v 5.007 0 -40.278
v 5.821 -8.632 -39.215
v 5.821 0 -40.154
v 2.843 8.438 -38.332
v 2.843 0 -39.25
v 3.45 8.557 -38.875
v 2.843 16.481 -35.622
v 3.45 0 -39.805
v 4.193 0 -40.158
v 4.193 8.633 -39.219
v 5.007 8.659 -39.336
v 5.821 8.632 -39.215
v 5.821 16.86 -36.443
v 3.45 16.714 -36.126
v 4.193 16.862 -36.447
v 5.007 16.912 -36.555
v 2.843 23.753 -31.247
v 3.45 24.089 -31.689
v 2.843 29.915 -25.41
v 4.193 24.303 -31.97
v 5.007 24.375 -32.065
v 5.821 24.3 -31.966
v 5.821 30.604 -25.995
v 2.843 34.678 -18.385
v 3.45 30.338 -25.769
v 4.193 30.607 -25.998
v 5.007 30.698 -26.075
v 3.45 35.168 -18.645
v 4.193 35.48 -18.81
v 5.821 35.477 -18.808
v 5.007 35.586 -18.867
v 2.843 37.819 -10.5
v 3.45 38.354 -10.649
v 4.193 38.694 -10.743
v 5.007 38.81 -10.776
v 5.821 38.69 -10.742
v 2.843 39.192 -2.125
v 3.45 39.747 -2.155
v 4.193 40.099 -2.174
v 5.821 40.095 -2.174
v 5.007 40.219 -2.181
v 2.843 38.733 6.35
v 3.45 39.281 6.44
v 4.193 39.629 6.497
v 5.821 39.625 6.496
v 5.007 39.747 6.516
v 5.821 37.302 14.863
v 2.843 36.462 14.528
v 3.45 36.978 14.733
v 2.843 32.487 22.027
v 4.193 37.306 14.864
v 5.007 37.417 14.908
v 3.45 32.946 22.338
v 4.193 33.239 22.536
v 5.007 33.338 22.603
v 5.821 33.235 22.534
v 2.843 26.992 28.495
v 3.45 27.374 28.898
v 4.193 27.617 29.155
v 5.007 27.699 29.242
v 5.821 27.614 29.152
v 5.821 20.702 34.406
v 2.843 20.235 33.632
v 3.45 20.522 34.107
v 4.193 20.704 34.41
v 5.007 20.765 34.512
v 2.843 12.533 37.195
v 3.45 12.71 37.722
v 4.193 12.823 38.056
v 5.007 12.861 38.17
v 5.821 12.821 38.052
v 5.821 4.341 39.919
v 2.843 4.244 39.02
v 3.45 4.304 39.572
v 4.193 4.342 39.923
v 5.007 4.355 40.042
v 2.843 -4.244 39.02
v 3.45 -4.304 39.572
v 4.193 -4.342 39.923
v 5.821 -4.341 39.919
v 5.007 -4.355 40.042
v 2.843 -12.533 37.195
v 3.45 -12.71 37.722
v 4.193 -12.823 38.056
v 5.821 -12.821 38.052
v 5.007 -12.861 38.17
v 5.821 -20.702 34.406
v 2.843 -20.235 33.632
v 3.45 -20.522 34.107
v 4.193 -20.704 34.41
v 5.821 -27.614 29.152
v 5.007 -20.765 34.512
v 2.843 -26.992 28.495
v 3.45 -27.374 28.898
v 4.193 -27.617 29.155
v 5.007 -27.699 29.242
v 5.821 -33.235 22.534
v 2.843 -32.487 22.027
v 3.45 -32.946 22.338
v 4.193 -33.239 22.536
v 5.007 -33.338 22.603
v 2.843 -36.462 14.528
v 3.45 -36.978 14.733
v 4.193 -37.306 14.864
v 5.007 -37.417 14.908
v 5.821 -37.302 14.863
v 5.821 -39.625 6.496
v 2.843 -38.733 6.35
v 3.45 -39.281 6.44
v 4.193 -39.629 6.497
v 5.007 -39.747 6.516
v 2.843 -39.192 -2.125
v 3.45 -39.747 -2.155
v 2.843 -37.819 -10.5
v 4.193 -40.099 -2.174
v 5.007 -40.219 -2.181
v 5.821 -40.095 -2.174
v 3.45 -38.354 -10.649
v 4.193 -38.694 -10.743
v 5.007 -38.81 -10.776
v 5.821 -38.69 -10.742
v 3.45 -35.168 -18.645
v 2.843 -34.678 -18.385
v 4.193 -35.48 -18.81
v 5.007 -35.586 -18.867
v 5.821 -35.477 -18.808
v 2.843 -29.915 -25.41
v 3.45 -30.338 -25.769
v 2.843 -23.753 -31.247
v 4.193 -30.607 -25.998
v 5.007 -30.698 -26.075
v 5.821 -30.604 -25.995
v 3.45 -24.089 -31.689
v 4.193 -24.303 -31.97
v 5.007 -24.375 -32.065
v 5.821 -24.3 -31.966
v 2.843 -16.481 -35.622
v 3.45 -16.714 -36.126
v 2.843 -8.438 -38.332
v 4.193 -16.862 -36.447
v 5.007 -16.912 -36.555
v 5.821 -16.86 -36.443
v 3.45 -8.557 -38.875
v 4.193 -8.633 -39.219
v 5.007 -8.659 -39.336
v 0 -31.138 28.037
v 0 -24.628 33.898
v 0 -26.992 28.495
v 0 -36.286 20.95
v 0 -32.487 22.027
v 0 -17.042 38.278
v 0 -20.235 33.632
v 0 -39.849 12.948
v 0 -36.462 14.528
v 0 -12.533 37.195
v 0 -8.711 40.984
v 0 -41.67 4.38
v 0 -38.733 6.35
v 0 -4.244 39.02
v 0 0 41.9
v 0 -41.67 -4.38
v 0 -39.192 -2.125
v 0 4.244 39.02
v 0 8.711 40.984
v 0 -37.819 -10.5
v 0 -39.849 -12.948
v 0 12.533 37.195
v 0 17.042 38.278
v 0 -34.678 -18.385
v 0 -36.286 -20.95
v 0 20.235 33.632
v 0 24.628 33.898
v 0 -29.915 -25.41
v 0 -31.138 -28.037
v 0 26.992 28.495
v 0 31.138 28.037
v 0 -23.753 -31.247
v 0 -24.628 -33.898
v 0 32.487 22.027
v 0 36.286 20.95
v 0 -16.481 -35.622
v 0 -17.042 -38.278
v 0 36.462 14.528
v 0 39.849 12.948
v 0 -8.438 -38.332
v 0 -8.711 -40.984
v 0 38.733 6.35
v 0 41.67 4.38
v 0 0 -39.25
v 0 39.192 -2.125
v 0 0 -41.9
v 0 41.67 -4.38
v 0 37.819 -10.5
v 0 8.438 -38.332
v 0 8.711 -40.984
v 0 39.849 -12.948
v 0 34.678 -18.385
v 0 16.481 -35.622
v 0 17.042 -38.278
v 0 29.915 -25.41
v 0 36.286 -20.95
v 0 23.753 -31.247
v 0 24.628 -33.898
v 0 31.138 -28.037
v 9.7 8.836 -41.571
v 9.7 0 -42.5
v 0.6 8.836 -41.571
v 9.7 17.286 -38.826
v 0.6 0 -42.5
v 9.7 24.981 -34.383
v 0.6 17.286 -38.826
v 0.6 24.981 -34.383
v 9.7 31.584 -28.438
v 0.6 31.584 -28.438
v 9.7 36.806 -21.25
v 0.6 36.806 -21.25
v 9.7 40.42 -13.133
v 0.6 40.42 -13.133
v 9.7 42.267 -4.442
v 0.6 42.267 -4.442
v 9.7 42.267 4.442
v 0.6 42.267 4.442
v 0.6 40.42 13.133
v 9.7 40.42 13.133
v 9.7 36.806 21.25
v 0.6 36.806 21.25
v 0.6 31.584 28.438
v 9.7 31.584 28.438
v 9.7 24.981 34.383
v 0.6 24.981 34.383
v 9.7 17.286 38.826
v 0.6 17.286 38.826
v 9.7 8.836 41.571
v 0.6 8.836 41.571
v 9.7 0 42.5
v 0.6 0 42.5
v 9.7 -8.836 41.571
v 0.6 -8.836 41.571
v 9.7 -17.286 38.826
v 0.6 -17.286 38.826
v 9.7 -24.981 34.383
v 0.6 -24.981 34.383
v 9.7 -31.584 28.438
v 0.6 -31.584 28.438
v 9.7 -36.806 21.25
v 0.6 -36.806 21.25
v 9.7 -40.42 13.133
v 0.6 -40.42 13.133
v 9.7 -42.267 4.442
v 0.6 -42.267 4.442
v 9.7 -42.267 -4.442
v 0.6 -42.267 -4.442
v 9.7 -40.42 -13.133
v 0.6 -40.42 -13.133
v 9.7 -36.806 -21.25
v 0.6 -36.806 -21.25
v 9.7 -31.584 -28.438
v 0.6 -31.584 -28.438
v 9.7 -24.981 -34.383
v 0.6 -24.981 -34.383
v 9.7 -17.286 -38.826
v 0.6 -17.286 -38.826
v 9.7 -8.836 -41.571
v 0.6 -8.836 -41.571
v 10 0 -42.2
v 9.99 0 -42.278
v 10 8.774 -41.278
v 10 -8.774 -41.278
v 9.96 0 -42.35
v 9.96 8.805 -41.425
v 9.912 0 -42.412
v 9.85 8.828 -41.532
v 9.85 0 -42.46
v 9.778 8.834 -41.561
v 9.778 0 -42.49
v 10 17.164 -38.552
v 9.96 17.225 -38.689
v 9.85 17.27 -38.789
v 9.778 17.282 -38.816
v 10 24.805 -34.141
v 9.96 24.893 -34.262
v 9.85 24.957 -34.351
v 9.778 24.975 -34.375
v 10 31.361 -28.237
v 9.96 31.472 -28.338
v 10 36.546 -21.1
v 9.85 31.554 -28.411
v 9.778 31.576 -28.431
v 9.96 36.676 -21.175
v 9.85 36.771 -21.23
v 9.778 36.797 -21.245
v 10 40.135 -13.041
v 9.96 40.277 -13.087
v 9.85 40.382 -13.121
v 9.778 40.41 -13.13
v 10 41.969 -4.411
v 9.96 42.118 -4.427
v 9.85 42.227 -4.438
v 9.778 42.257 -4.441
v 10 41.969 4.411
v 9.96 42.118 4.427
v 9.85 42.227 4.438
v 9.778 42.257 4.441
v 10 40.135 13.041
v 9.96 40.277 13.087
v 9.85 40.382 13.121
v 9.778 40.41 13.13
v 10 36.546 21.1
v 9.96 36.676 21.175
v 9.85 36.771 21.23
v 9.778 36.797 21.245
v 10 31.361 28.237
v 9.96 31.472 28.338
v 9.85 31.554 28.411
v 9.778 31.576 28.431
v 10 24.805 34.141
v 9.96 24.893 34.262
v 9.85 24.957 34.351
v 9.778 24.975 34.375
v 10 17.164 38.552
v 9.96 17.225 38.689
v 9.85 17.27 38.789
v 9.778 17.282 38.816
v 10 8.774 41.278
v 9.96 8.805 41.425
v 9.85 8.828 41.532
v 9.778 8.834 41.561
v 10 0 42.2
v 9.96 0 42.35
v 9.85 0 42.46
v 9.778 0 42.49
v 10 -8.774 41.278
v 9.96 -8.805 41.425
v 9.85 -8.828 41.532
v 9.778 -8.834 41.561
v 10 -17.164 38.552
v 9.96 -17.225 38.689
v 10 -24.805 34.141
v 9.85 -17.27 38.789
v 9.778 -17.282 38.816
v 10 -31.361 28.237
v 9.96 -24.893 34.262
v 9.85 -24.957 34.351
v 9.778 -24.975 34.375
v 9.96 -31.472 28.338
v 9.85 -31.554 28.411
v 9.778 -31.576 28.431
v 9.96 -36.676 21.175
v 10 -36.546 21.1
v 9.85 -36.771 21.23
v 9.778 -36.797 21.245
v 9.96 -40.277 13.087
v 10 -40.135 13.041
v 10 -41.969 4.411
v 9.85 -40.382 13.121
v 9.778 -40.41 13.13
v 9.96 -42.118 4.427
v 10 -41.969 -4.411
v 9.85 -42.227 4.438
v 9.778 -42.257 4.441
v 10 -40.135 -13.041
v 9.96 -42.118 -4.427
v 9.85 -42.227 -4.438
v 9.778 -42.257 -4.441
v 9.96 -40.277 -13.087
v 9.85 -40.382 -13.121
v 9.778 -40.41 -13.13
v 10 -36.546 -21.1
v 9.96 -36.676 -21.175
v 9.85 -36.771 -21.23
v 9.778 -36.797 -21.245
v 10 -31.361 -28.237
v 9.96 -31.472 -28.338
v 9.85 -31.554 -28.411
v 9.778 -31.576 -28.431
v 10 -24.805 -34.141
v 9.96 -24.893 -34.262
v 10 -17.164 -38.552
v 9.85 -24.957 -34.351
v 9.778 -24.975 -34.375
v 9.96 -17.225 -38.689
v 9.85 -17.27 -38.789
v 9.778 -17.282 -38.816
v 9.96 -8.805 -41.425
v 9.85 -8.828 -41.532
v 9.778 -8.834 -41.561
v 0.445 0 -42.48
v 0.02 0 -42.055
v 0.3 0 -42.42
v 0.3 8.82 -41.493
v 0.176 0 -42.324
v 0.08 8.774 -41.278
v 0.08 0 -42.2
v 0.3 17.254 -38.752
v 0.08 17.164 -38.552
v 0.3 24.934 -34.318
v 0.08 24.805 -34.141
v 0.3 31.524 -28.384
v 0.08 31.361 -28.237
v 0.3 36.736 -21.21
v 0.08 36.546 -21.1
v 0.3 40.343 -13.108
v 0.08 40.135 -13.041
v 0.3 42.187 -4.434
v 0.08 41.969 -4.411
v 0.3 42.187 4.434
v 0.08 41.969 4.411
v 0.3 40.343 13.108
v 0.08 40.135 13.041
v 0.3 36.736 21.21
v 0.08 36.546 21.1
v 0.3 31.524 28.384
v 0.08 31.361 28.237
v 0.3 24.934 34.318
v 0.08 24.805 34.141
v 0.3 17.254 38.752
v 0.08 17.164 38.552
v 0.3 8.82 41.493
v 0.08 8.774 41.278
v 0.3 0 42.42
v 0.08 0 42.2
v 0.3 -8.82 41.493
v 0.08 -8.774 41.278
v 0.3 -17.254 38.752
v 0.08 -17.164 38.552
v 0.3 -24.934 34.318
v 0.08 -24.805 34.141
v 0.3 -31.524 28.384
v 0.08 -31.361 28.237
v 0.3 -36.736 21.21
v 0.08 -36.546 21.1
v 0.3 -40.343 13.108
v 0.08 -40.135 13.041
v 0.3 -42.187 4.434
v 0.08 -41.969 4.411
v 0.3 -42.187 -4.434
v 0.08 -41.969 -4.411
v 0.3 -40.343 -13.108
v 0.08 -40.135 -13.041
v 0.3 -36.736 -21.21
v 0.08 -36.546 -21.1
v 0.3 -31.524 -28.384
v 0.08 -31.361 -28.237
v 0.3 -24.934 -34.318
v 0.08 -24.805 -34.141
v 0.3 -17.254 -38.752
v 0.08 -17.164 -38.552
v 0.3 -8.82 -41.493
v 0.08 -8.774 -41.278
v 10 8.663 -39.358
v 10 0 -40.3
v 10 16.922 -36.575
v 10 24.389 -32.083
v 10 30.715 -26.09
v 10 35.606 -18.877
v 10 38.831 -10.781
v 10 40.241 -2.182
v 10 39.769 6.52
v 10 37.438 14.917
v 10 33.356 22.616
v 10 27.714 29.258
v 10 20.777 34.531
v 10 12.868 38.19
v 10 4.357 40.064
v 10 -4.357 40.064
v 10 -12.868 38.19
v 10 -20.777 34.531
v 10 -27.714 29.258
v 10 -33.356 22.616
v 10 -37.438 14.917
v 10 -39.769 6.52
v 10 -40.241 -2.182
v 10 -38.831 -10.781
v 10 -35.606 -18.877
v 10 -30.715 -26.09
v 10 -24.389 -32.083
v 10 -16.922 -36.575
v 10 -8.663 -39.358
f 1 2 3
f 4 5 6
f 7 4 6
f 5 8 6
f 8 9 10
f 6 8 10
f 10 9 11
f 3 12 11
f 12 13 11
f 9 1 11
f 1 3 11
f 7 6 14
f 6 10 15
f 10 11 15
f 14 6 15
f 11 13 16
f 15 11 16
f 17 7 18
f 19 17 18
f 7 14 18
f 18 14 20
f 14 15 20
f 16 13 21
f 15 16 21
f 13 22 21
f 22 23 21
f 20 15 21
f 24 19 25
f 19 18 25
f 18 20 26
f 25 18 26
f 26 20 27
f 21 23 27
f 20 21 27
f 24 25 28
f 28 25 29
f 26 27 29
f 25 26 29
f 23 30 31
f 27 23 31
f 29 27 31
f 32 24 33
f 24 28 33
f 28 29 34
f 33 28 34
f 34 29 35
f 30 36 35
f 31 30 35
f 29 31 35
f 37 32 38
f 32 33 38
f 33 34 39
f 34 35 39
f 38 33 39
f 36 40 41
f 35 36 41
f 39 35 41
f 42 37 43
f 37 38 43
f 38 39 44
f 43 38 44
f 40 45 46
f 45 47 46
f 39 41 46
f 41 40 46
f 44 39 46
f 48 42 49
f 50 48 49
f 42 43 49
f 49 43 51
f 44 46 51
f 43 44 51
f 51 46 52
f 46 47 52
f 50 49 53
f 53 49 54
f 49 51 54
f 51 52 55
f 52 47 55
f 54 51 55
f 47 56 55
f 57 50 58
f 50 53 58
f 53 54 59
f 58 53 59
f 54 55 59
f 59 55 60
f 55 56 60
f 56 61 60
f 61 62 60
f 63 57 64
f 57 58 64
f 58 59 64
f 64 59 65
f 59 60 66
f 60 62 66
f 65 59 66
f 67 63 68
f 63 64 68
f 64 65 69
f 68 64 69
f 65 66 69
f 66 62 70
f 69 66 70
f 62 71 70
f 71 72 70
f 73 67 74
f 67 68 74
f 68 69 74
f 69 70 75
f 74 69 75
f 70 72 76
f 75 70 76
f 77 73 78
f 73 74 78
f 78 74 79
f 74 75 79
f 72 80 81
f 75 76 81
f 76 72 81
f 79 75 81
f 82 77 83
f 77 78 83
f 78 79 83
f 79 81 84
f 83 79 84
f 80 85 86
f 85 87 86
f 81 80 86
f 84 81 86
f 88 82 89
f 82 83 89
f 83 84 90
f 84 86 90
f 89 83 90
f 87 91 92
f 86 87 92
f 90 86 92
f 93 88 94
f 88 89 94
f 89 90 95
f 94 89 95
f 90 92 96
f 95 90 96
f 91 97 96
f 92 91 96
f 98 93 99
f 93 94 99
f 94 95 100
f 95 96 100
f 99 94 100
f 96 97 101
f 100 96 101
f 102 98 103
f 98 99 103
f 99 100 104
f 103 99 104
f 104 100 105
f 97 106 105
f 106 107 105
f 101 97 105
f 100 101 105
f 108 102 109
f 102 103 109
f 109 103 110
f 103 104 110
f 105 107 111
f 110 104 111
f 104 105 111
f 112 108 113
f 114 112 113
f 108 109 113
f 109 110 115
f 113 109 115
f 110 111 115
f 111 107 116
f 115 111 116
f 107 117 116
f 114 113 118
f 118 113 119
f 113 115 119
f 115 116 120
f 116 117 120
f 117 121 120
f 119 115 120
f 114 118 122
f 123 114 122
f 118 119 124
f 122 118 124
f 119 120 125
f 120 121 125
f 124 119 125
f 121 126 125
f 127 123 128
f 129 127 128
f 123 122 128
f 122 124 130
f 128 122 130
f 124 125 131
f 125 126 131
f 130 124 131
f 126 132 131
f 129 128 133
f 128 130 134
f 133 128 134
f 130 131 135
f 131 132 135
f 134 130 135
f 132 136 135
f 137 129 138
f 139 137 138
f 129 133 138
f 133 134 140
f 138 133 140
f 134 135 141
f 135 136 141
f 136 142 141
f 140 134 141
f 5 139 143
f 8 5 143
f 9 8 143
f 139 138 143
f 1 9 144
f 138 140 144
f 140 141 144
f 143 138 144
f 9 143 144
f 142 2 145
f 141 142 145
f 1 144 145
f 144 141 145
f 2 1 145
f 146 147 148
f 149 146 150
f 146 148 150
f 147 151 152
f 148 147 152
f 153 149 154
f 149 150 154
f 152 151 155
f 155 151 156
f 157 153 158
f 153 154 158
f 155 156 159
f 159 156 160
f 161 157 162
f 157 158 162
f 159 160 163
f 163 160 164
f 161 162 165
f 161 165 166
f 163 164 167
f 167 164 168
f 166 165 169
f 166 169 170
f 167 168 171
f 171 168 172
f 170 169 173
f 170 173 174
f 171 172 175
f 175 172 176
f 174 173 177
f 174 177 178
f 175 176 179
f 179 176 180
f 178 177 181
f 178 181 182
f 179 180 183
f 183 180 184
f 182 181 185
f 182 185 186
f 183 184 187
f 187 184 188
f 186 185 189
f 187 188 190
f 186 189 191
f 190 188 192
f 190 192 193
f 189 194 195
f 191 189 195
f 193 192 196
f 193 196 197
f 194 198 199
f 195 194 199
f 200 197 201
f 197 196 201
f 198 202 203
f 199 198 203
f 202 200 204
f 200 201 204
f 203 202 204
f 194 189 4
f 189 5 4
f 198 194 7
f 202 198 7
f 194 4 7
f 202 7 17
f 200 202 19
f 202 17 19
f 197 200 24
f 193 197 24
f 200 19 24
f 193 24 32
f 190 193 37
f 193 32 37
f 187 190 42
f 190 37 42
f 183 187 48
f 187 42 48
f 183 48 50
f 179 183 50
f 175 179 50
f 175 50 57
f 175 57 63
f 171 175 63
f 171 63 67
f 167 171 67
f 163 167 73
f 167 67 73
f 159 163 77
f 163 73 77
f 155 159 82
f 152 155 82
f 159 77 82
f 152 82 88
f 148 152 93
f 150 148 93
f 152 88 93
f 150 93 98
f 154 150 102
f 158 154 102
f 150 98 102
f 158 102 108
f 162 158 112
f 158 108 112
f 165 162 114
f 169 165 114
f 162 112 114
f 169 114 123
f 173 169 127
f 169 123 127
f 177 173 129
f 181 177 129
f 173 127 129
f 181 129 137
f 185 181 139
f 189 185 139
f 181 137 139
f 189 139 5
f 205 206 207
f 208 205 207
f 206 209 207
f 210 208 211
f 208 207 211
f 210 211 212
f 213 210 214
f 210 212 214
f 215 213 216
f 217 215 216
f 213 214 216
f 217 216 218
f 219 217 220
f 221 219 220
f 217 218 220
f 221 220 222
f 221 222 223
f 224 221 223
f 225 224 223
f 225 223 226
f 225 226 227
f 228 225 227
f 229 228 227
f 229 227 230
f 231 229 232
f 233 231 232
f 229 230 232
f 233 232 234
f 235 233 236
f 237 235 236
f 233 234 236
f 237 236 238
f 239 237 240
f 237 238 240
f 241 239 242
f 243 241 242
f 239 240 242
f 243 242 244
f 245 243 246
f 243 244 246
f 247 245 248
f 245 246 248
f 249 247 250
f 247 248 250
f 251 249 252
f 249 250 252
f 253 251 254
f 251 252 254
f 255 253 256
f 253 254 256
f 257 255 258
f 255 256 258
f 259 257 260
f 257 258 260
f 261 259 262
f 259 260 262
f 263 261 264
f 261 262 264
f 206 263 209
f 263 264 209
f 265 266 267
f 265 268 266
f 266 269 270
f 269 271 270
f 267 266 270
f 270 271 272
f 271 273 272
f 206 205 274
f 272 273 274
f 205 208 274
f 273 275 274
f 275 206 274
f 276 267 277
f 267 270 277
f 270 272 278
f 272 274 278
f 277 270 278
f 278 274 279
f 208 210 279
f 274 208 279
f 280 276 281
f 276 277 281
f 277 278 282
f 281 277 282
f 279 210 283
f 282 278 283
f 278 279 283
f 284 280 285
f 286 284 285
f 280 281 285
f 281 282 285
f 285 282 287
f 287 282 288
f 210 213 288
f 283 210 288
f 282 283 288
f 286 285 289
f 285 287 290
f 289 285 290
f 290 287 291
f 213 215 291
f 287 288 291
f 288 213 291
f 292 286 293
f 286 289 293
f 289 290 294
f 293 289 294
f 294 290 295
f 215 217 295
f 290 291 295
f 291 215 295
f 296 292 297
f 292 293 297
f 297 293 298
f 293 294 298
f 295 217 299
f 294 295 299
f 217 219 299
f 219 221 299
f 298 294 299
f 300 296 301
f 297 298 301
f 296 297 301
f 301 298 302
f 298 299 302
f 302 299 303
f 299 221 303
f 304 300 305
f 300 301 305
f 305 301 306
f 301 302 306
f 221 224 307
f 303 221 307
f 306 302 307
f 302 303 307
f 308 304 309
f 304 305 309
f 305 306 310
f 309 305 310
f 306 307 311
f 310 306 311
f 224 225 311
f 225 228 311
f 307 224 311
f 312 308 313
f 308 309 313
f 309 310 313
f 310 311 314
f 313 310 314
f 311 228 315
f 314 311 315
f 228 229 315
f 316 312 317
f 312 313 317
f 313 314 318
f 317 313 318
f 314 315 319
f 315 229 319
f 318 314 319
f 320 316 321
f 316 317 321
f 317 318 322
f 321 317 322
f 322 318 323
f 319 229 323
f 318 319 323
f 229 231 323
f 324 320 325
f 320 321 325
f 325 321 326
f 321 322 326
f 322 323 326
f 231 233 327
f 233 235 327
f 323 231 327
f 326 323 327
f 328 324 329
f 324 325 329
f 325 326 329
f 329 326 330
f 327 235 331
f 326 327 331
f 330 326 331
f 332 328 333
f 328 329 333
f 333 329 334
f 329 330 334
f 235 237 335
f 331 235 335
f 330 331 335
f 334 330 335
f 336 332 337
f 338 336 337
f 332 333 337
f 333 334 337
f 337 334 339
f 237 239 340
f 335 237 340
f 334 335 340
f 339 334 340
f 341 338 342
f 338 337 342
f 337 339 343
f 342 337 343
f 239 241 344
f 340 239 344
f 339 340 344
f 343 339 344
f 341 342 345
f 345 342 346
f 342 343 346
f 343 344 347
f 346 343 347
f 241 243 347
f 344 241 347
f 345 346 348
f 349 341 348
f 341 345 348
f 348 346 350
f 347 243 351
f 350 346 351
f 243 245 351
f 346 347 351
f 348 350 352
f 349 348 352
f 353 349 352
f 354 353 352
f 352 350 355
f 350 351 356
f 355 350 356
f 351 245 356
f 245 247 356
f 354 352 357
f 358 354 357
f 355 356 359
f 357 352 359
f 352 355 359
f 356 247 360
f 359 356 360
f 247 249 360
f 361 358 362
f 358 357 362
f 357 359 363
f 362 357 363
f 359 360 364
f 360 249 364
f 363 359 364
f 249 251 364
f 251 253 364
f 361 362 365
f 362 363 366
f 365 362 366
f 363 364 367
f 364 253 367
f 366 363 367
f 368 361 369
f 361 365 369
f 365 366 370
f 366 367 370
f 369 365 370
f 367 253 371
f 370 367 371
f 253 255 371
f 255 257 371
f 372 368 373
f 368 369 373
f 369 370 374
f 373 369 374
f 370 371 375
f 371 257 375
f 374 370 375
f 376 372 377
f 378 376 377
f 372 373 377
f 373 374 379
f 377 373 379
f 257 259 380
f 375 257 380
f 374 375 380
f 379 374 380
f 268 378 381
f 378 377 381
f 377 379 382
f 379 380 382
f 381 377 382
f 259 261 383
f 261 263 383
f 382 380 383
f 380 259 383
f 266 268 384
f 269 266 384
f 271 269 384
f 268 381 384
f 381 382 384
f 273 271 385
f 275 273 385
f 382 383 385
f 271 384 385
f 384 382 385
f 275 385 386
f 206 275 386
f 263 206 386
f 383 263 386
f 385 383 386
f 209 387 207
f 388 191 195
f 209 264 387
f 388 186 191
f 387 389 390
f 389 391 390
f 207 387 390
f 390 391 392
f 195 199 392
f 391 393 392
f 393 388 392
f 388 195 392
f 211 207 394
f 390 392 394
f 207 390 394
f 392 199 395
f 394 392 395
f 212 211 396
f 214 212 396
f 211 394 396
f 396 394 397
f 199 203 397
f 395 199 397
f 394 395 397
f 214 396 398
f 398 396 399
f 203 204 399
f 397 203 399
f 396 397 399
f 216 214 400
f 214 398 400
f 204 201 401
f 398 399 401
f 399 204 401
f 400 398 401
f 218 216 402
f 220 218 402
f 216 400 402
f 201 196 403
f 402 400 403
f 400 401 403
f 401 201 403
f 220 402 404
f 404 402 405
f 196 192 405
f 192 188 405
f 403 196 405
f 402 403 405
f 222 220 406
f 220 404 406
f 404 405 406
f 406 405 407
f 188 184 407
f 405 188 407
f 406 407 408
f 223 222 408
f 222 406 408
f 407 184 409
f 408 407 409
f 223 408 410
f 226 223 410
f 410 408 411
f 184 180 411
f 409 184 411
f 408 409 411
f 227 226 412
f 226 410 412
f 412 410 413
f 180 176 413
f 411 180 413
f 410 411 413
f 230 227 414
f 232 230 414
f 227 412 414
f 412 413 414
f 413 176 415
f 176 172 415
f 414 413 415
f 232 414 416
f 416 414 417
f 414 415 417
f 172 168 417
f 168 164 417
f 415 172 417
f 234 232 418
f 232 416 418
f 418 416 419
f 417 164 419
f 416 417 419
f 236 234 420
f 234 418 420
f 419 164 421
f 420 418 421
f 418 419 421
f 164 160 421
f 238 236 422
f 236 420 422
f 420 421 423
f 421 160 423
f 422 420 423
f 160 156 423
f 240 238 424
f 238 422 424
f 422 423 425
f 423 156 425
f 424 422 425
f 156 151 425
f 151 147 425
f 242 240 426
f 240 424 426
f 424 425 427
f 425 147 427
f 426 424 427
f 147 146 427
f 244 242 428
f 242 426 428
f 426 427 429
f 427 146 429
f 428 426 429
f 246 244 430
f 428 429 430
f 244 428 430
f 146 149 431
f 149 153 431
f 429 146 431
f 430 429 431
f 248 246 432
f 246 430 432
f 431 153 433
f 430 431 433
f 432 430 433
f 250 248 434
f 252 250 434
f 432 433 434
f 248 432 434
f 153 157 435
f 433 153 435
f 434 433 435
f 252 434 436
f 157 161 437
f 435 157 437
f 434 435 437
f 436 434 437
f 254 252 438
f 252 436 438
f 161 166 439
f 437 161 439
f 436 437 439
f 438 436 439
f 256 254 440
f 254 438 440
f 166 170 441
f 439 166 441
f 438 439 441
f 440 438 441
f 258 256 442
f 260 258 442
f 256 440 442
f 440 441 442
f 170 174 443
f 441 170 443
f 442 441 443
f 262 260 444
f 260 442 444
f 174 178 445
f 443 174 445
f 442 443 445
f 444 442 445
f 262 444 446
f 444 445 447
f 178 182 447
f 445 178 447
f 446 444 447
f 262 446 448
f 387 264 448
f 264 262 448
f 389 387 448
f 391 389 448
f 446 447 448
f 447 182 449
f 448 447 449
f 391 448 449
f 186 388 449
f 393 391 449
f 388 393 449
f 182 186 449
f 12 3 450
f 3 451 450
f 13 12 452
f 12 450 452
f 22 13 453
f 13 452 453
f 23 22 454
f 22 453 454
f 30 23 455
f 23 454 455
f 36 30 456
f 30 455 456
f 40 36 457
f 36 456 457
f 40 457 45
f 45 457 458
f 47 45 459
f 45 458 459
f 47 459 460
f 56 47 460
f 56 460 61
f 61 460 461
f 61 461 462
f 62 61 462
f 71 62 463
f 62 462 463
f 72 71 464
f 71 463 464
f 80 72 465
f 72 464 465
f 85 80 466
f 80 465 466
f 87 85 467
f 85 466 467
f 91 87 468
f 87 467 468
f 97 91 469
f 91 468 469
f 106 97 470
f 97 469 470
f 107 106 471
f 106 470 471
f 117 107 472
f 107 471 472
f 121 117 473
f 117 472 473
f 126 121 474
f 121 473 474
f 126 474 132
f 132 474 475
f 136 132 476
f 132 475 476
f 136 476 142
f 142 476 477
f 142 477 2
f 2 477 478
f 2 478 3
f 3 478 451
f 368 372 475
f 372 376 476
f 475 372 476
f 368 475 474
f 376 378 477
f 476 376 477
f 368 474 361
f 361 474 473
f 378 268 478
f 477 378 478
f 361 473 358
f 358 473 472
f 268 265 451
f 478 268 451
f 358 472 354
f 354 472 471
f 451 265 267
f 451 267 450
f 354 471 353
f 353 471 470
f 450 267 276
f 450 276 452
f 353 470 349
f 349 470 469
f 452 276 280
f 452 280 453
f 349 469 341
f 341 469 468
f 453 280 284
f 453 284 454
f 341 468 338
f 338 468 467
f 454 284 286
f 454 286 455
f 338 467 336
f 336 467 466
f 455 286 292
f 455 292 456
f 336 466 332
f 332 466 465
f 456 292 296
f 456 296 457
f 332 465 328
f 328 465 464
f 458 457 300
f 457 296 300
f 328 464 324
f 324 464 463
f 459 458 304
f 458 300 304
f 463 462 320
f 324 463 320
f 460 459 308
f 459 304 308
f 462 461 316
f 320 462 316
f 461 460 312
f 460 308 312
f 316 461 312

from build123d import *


with BuildPart() as part:
    # 草图1 → 旋转1 (revolve)
    with BuildSketch(Plane.XY, mode=Mode.PRIVATE) as revolve_1_sk:
        with BuildLine():
            Line((9.7, 42.5), (0.6, 42.5))
            ThreePointArc((0.6, 42.5), (0.175735931, 42.324264069), (0, 41.9))
            Line((0, 41.9), (0, 39.25))
            Line((0, 39.25), (2.842505156, 39.25))
            ThreePointArc((2.842505156, 39.25), (4.193041023, 40.158213914), (5.820549028, 40.154050356))
            Line((5.820549028, 40.154050356), (10, 40.3))
            Line((10, 40.3), (10, 42.2))
            ThreePointArc((10, 42.2), (9.912132034, 42.412132034), (9.7, 42.5))
        make_face()
    revolve(revolve_1_sk.sketch.rotate(Axis((-0.001270488, 0, 0), (1, 0, 0)), 270), axis=Axis((-0.001270488, 0, 0), (1, 0, 0)))


solid = part.part
